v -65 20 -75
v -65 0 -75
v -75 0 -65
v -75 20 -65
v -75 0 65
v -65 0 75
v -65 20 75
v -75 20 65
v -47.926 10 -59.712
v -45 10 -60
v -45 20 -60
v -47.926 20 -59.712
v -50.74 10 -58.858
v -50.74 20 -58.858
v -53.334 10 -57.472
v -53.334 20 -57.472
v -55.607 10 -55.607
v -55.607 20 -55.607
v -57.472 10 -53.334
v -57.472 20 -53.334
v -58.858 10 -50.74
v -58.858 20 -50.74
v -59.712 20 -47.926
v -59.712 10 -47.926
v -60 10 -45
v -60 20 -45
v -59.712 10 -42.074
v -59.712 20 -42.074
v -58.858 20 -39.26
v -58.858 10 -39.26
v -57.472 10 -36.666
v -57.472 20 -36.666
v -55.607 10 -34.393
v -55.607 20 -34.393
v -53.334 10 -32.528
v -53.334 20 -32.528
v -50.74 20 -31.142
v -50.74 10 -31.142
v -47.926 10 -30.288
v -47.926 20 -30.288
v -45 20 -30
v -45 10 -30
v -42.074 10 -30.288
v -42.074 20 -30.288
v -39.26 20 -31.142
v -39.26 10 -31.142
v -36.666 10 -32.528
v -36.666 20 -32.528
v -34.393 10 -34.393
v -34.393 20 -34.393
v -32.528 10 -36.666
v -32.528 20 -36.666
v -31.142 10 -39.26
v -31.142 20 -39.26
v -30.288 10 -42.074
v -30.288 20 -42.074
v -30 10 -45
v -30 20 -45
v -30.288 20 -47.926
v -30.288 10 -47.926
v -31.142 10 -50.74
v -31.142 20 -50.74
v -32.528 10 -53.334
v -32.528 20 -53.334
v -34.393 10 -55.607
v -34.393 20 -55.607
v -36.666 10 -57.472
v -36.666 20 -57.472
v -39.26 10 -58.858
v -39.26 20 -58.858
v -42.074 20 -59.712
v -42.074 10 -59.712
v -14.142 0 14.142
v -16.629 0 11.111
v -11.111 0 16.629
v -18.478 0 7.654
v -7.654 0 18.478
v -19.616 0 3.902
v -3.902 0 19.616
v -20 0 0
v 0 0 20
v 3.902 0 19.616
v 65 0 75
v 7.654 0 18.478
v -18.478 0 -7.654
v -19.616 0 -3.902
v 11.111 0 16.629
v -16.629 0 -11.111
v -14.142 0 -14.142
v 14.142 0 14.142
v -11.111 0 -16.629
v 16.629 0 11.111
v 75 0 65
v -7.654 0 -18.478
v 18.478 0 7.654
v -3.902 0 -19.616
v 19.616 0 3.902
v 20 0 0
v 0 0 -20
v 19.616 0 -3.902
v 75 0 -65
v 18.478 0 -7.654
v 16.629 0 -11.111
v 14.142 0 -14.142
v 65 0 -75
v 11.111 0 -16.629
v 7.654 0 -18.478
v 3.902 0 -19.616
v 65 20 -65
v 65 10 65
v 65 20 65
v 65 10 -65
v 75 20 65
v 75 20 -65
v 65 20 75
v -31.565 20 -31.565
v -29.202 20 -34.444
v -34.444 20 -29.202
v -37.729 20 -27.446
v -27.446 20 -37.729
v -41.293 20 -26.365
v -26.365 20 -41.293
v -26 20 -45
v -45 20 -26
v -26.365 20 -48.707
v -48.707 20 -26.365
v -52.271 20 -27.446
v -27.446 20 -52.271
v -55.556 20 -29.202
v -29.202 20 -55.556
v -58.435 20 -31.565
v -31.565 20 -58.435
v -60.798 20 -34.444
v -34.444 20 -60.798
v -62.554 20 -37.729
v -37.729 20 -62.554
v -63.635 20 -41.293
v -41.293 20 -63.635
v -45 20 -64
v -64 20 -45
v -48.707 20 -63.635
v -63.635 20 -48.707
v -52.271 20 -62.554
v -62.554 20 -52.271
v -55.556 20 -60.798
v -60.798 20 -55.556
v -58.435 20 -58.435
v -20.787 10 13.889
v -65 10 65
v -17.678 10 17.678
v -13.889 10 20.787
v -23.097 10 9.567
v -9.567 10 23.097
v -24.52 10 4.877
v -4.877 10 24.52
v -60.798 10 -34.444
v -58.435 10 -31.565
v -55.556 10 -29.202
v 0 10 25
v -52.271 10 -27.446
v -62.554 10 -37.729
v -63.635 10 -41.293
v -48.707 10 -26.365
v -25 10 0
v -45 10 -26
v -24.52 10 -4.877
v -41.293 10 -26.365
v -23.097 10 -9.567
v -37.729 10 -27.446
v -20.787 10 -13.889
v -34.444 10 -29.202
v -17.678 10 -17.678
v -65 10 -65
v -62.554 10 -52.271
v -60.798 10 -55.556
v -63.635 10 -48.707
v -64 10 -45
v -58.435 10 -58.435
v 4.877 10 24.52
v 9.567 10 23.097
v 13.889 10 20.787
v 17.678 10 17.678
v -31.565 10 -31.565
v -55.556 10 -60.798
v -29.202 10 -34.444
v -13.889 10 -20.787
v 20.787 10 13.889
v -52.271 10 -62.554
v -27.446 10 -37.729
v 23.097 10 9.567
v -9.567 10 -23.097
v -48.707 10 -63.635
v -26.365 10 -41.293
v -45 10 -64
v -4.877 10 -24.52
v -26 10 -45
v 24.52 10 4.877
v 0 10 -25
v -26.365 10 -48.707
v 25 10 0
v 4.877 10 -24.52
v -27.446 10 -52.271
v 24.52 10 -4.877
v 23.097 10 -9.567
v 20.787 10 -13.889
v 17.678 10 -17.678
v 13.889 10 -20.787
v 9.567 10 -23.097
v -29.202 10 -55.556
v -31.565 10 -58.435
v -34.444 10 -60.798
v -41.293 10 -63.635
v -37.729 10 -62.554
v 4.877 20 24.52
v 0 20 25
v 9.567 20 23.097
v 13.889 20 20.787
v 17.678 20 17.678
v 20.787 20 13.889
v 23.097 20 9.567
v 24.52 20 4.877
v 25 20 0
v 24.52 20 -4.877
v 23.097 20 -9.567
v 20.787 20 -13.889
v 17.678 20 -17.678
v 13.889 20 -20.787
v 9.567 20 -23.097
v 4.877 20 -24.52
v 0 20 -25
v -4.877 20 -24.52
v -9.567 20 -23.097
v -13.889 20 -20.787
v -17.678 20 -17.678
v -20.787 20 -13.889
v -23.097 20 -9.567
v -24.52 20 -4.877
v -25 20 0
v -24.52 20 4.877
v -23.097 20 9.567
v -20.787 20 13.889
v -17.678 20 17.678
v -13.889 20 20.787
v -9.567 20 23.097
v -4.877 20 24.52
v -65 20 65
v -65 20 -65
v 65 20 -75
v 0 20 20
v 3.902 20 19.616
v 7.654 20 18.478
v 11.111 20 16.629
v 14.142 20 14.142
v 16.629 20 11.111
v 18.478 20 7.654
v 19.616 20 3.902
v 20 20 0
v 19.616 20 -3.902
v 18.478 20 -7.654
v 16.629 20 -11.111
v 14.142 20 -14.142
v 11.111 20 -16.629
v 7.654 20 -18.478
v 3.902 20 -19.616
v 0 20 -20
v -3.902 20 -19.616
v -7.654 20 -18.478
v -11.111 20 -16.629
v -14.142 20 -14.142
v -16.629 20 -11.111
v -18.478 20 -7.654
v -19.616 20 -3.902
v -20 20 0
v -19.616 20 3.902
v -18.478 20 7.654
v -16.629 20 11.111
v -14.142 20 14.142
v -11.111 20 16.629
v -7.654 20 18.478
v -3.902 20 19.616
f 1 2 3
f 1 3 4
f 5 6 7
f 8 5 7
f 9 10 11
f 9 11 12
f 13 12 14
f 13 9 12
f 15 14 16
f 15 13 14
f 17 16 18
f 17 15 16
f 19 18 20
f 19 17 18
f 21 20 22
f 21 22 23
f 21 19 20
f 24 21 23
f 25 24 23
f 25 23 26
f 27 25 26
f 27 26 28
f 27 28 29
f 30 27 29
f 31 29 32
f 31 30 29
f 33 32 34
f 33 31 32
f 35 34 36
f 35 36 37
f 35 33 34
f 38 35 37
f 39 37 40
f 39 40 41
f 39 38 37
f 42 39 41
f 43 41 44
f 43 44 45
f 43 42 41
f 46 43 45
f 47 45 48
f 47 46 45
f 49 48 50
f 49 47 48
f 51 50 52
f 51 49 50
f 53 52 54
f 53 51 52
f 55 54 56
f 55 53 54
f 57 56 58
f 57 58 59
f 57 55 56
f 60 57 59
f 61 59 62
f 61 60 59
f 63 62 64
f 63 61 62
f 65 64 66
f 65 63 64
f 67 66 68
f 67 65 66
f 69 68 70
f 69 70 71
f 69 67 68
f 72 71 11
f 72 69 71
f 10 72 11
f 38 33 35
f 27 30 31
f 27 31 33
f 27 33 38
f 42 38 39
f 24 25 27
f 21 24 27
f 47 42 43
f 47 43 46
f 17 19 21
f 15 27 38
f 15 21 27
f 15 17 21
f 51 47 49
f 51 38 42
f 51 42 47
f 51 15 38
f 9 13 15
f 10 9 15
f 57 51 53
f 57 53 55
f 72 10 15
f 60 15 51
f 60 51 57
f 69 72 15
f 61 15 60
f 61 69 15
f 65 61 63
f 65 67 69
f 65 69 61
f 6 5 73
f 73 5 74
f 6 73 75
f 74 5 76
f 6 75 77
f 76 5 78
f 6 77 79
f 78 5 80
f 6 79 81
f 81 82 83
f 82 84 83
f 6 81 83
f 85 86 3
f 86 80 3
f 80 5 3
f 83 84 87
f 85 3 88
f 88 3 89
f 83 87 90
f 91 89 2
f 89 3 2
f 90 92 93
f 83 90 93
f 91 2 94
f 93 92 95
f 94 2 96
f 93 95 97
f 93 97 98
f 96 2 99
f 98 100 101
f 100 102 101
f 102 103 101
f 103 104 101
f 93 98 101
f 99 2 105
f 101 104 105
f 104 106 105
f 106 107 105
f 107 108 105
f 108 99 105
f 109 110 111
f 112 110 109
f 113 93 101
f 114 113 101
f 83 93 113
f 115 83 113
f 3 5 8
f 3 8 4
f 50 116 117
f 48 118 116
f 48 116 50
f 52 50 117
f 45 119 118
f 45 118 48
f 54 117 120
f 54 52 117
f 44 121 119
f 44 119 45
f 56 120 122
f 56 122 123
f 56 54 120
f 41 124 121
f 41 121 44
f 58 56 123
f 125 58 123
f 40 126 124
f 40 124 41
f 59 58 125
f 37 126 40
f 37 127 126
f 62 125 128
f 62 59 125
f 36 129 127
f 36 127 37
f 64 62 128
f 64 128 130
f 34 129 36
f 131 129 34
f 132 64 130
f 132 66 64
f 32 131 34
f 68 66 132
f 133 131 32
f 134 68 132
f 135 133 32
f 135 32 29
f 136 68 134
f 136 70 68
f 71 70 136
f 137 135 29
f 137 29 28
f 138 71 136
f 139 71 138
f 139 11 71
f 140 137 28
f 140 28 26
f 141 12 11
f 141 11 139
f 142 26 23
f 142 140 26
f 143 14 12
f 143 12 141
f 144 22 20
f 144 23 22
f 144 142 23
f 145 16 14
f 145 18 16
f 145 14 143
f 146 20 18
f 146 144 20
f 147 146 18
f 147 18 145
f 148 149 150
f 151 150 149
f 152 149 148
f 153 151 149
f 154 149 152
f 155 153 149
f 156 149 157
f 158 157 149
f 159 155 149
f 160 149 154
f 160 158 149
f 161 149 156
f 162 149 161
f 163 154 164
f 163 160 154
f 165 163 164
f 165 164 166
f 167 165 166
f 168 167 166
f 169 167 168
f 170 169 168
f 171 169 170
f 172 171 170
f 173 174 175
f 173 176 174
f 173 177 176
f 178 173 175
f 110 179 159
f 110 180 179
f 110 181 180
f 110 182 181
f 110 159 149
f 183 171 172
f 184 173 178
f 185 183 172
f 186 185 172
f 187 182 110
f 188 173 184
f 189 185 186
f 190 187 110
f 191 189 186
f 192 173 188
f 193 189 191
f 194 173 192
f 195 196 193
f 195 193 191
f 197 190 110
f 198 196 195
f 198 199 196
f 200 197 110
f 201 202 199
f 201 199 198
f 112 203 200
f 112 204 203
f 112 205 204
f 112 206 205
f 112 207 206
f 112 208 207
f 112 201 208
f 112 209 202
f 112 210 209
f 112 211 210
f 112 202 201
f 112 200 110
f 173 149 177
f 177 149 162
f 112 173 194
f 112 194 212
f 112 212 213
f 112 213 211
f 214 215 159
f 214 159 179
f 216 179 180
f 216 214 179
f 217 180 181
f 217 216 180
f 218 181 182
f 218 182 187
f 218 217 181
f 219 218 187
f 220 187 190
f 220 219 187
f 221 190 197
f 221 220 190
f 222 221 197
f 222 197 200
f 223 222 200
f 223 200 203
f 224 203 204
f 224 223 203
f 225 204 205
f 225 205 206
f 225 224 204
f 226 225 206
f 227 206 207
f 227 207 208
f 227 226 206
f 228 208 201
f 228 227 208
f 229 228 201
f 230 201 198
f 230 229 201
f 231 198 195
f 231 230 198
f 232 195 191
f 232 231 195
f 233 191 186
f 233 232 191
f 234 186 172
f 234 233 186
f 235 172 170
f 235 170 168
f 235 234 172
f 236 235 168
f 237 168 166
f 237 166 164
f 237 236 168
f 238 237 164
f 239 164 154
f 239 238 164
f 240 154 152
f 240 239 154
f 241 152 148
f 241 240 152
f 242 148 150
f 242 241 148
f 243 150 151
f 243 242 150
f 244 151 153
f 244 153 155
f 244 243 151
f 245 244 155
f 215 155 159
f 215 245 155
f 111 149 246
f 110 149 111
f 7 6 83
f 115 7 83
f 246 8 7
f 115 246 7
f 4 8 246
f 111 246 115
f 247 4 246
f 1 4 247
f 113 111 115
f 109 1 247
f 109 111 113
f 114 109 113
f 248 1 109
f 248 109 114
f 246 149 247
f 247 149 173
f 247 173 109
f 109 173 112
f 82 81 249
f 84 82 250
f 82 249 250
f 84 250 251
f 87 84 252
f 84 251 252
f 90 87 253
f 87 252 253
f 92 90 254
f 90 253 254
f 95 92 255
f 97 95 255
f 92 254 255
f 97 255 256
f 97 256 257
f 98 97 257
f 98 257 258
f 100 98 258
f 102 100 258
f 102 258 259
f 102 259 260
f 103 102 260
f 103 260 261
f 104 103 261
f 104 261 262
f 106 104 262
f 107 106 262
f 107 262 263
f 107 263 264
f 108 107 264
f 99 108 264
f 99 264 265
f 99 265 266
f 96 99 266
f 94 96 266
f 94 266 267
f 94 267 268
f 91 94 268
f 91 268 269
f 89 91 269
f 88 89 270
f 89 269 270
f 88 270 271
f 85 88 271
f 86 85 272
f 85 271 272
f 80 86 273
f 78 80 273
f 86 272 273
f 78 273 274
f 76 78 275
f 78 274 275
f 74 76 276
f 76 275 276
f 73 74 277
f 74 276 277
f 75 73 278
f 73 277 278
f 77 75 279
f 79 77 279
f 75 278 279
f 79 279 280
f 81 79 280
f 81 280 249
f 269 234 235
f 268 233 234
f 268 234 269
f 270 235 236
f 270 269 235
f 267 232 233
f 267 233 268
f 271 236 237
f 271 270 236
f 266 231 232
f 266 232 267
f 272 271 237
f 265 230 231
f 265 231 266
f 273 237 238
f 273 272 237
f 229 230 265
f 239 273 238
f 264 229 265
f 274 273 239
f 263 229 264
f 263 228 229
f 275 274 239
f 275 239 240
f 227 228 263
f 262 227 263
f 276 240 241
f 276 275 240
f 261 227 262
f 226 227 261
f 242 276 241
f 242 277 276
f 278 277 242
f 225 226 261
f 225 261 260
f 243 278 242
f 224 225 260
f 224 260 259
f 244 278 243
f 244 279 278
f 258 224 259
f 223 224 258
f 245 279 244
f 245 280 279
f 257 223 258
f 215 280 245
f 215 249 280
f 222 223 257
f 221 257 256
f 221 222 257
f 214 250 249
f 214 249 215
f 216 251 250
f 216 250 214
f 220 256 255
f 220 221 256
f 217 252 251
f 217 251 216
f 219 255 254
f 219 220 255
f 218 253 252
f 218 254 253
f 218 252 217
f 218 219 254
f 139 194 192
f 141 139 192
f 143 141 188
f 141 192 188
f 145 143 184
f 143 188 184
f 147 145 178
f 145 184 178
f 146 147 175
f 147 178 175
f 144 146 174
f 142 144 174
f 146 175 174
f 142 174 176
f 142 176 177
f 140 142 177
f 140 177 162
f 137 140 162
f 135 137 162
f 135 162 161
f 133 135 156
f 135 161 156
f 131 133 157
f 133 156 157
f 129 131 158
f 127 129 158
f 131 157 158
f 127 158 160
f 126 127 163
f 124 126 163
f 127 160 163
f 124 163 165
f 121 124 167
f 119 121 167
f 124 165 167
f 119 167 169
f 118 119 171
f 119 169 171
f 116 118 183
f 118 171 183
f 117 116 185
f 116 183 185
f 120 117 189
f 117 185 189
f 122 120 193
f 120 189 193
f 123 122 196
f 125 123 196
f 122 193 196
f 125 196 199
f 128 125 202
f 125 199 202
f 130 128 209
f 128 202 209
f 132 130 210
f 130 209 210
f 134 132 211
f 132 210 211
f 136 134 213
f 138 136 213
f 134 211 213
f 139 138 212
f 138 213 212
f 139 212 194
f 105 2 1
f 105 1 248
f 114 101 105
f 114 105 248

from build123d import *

# Parameters (mm, degrees)
SKETCH1_W           = 150
SKETCH1_H           = 150
SKETCH1_W_2         = 130
SKETCH1_H_2         = 130
BOSS_EXTRUDE2_DEPTH = 20
SKETCH1_4_W         = 130
SKETCH1_4_H         = 130
BOSS_EXTRUDE3_DEPTH = 10
CHAMFER1_SIZE       = 10
SKETCH2_R           = 20
CUT_EXTRUDE2_DEPTH  = 10
BOSS_EXTRUDE4_START = 10
SKETCH3_R           = 25
SKETCH3_R_2         = 20
BOSS_EXTRUDE4_DEPTH = 10
SKETCH4_R           = 19
SKETCH4_R_2         = 15
BOSS_EXTRUDE5_DEPTH = 10


with BuildPart() as part:
    # Sketch1 → Boss-Extrude2 (new body)
    with BuildSketch(Plane(origin=(0, 0, 0), x_dir=(1, 0, 0), z_dir=(0, 1, 0))):
        Rectangle(SKETCH1_W, SKETCH1_H)
        Rectangle(SKETCH1_W_2, SKETCH1_H_2, mode=Mode.SUBTRACT)
    extrude(amount=BOSS_EXTRUDE2_DEPTH)

    # Sketch1<4> → Boss-Extrude3 (add)
    with BuildSketch(Plane(origin=(0, 0, 0), x_dir=(1, 0, 0), z_dir=(0, 1, 0))):
        Rectangle(SKETCH1_4_W, SKETCH1_4_H)
    extrude(amount=BOSS_EXTRUDE3_DEPTH)

    # Chamfer1
    chamfer1_edges = [part.edges().sort_by_distance(p)[0] for p in [
        (75, 10, 75),
        (-75, 10, 75),
        (-75, 10, -75),
        (75, 10, -75),
    ]]
    chamfer(chamfer1_edges, length=CHAMFER1_SIZE)

    # Sketch2 → Cut-Extrude2 (cut)
    with BuildSketch(Plane(origin=(0, 10, 0), x_dir=(1, 0, 0), z_dir=(0, 1, 0))):
        with Locations(Location((0, 0, 0), (0, 0, 270))):
            Circle(SKETCH2_R)
    extrude(amount=-CUT_EXTRUDE2_DEPTH, mode=Mode.SUBTRACT)

    # Sketch3 → Boss-Extrude4 (add)
    with BuildSketch(Plane(origin=(0, 10, 0), x_dir=(1, 0, 0), z_dir=(0, 1, 0)).offset(BOSS_EXTRUDE4_START)):
        with Locations(Location((0, 0, 0), (0, 0, 270))):
            Circle(SKETCH3_R)
        with Locations(Location((0, 0, 0), (0, 0, 270))):
            Circle(SKETCH3_R_2, mode=Mode.SUBTRACT)
    extrude(amount=-BOSS_EXTRUDE4_DEPTH)

    # Sketch4 → Boss-Extrude5 (add)
    with BuildSketch(Plane(origin=(0, 10, 0), x_dir=(1, 0, 0), z_dir=(0, 1, 0))):
        with Locations(Location((-45, 45, 0), (0, 0, 90))):
            Circle(SKETCH4_R)
        with Locations(Location((-45, 45, 0), (0, 0, 90))):
            Circle(SKETCH4_R_2, mode=Mode.SUBTRACT)
    extrude(amount=BOSS_EXTRUDE5_DEPTH)


solid = part.part
